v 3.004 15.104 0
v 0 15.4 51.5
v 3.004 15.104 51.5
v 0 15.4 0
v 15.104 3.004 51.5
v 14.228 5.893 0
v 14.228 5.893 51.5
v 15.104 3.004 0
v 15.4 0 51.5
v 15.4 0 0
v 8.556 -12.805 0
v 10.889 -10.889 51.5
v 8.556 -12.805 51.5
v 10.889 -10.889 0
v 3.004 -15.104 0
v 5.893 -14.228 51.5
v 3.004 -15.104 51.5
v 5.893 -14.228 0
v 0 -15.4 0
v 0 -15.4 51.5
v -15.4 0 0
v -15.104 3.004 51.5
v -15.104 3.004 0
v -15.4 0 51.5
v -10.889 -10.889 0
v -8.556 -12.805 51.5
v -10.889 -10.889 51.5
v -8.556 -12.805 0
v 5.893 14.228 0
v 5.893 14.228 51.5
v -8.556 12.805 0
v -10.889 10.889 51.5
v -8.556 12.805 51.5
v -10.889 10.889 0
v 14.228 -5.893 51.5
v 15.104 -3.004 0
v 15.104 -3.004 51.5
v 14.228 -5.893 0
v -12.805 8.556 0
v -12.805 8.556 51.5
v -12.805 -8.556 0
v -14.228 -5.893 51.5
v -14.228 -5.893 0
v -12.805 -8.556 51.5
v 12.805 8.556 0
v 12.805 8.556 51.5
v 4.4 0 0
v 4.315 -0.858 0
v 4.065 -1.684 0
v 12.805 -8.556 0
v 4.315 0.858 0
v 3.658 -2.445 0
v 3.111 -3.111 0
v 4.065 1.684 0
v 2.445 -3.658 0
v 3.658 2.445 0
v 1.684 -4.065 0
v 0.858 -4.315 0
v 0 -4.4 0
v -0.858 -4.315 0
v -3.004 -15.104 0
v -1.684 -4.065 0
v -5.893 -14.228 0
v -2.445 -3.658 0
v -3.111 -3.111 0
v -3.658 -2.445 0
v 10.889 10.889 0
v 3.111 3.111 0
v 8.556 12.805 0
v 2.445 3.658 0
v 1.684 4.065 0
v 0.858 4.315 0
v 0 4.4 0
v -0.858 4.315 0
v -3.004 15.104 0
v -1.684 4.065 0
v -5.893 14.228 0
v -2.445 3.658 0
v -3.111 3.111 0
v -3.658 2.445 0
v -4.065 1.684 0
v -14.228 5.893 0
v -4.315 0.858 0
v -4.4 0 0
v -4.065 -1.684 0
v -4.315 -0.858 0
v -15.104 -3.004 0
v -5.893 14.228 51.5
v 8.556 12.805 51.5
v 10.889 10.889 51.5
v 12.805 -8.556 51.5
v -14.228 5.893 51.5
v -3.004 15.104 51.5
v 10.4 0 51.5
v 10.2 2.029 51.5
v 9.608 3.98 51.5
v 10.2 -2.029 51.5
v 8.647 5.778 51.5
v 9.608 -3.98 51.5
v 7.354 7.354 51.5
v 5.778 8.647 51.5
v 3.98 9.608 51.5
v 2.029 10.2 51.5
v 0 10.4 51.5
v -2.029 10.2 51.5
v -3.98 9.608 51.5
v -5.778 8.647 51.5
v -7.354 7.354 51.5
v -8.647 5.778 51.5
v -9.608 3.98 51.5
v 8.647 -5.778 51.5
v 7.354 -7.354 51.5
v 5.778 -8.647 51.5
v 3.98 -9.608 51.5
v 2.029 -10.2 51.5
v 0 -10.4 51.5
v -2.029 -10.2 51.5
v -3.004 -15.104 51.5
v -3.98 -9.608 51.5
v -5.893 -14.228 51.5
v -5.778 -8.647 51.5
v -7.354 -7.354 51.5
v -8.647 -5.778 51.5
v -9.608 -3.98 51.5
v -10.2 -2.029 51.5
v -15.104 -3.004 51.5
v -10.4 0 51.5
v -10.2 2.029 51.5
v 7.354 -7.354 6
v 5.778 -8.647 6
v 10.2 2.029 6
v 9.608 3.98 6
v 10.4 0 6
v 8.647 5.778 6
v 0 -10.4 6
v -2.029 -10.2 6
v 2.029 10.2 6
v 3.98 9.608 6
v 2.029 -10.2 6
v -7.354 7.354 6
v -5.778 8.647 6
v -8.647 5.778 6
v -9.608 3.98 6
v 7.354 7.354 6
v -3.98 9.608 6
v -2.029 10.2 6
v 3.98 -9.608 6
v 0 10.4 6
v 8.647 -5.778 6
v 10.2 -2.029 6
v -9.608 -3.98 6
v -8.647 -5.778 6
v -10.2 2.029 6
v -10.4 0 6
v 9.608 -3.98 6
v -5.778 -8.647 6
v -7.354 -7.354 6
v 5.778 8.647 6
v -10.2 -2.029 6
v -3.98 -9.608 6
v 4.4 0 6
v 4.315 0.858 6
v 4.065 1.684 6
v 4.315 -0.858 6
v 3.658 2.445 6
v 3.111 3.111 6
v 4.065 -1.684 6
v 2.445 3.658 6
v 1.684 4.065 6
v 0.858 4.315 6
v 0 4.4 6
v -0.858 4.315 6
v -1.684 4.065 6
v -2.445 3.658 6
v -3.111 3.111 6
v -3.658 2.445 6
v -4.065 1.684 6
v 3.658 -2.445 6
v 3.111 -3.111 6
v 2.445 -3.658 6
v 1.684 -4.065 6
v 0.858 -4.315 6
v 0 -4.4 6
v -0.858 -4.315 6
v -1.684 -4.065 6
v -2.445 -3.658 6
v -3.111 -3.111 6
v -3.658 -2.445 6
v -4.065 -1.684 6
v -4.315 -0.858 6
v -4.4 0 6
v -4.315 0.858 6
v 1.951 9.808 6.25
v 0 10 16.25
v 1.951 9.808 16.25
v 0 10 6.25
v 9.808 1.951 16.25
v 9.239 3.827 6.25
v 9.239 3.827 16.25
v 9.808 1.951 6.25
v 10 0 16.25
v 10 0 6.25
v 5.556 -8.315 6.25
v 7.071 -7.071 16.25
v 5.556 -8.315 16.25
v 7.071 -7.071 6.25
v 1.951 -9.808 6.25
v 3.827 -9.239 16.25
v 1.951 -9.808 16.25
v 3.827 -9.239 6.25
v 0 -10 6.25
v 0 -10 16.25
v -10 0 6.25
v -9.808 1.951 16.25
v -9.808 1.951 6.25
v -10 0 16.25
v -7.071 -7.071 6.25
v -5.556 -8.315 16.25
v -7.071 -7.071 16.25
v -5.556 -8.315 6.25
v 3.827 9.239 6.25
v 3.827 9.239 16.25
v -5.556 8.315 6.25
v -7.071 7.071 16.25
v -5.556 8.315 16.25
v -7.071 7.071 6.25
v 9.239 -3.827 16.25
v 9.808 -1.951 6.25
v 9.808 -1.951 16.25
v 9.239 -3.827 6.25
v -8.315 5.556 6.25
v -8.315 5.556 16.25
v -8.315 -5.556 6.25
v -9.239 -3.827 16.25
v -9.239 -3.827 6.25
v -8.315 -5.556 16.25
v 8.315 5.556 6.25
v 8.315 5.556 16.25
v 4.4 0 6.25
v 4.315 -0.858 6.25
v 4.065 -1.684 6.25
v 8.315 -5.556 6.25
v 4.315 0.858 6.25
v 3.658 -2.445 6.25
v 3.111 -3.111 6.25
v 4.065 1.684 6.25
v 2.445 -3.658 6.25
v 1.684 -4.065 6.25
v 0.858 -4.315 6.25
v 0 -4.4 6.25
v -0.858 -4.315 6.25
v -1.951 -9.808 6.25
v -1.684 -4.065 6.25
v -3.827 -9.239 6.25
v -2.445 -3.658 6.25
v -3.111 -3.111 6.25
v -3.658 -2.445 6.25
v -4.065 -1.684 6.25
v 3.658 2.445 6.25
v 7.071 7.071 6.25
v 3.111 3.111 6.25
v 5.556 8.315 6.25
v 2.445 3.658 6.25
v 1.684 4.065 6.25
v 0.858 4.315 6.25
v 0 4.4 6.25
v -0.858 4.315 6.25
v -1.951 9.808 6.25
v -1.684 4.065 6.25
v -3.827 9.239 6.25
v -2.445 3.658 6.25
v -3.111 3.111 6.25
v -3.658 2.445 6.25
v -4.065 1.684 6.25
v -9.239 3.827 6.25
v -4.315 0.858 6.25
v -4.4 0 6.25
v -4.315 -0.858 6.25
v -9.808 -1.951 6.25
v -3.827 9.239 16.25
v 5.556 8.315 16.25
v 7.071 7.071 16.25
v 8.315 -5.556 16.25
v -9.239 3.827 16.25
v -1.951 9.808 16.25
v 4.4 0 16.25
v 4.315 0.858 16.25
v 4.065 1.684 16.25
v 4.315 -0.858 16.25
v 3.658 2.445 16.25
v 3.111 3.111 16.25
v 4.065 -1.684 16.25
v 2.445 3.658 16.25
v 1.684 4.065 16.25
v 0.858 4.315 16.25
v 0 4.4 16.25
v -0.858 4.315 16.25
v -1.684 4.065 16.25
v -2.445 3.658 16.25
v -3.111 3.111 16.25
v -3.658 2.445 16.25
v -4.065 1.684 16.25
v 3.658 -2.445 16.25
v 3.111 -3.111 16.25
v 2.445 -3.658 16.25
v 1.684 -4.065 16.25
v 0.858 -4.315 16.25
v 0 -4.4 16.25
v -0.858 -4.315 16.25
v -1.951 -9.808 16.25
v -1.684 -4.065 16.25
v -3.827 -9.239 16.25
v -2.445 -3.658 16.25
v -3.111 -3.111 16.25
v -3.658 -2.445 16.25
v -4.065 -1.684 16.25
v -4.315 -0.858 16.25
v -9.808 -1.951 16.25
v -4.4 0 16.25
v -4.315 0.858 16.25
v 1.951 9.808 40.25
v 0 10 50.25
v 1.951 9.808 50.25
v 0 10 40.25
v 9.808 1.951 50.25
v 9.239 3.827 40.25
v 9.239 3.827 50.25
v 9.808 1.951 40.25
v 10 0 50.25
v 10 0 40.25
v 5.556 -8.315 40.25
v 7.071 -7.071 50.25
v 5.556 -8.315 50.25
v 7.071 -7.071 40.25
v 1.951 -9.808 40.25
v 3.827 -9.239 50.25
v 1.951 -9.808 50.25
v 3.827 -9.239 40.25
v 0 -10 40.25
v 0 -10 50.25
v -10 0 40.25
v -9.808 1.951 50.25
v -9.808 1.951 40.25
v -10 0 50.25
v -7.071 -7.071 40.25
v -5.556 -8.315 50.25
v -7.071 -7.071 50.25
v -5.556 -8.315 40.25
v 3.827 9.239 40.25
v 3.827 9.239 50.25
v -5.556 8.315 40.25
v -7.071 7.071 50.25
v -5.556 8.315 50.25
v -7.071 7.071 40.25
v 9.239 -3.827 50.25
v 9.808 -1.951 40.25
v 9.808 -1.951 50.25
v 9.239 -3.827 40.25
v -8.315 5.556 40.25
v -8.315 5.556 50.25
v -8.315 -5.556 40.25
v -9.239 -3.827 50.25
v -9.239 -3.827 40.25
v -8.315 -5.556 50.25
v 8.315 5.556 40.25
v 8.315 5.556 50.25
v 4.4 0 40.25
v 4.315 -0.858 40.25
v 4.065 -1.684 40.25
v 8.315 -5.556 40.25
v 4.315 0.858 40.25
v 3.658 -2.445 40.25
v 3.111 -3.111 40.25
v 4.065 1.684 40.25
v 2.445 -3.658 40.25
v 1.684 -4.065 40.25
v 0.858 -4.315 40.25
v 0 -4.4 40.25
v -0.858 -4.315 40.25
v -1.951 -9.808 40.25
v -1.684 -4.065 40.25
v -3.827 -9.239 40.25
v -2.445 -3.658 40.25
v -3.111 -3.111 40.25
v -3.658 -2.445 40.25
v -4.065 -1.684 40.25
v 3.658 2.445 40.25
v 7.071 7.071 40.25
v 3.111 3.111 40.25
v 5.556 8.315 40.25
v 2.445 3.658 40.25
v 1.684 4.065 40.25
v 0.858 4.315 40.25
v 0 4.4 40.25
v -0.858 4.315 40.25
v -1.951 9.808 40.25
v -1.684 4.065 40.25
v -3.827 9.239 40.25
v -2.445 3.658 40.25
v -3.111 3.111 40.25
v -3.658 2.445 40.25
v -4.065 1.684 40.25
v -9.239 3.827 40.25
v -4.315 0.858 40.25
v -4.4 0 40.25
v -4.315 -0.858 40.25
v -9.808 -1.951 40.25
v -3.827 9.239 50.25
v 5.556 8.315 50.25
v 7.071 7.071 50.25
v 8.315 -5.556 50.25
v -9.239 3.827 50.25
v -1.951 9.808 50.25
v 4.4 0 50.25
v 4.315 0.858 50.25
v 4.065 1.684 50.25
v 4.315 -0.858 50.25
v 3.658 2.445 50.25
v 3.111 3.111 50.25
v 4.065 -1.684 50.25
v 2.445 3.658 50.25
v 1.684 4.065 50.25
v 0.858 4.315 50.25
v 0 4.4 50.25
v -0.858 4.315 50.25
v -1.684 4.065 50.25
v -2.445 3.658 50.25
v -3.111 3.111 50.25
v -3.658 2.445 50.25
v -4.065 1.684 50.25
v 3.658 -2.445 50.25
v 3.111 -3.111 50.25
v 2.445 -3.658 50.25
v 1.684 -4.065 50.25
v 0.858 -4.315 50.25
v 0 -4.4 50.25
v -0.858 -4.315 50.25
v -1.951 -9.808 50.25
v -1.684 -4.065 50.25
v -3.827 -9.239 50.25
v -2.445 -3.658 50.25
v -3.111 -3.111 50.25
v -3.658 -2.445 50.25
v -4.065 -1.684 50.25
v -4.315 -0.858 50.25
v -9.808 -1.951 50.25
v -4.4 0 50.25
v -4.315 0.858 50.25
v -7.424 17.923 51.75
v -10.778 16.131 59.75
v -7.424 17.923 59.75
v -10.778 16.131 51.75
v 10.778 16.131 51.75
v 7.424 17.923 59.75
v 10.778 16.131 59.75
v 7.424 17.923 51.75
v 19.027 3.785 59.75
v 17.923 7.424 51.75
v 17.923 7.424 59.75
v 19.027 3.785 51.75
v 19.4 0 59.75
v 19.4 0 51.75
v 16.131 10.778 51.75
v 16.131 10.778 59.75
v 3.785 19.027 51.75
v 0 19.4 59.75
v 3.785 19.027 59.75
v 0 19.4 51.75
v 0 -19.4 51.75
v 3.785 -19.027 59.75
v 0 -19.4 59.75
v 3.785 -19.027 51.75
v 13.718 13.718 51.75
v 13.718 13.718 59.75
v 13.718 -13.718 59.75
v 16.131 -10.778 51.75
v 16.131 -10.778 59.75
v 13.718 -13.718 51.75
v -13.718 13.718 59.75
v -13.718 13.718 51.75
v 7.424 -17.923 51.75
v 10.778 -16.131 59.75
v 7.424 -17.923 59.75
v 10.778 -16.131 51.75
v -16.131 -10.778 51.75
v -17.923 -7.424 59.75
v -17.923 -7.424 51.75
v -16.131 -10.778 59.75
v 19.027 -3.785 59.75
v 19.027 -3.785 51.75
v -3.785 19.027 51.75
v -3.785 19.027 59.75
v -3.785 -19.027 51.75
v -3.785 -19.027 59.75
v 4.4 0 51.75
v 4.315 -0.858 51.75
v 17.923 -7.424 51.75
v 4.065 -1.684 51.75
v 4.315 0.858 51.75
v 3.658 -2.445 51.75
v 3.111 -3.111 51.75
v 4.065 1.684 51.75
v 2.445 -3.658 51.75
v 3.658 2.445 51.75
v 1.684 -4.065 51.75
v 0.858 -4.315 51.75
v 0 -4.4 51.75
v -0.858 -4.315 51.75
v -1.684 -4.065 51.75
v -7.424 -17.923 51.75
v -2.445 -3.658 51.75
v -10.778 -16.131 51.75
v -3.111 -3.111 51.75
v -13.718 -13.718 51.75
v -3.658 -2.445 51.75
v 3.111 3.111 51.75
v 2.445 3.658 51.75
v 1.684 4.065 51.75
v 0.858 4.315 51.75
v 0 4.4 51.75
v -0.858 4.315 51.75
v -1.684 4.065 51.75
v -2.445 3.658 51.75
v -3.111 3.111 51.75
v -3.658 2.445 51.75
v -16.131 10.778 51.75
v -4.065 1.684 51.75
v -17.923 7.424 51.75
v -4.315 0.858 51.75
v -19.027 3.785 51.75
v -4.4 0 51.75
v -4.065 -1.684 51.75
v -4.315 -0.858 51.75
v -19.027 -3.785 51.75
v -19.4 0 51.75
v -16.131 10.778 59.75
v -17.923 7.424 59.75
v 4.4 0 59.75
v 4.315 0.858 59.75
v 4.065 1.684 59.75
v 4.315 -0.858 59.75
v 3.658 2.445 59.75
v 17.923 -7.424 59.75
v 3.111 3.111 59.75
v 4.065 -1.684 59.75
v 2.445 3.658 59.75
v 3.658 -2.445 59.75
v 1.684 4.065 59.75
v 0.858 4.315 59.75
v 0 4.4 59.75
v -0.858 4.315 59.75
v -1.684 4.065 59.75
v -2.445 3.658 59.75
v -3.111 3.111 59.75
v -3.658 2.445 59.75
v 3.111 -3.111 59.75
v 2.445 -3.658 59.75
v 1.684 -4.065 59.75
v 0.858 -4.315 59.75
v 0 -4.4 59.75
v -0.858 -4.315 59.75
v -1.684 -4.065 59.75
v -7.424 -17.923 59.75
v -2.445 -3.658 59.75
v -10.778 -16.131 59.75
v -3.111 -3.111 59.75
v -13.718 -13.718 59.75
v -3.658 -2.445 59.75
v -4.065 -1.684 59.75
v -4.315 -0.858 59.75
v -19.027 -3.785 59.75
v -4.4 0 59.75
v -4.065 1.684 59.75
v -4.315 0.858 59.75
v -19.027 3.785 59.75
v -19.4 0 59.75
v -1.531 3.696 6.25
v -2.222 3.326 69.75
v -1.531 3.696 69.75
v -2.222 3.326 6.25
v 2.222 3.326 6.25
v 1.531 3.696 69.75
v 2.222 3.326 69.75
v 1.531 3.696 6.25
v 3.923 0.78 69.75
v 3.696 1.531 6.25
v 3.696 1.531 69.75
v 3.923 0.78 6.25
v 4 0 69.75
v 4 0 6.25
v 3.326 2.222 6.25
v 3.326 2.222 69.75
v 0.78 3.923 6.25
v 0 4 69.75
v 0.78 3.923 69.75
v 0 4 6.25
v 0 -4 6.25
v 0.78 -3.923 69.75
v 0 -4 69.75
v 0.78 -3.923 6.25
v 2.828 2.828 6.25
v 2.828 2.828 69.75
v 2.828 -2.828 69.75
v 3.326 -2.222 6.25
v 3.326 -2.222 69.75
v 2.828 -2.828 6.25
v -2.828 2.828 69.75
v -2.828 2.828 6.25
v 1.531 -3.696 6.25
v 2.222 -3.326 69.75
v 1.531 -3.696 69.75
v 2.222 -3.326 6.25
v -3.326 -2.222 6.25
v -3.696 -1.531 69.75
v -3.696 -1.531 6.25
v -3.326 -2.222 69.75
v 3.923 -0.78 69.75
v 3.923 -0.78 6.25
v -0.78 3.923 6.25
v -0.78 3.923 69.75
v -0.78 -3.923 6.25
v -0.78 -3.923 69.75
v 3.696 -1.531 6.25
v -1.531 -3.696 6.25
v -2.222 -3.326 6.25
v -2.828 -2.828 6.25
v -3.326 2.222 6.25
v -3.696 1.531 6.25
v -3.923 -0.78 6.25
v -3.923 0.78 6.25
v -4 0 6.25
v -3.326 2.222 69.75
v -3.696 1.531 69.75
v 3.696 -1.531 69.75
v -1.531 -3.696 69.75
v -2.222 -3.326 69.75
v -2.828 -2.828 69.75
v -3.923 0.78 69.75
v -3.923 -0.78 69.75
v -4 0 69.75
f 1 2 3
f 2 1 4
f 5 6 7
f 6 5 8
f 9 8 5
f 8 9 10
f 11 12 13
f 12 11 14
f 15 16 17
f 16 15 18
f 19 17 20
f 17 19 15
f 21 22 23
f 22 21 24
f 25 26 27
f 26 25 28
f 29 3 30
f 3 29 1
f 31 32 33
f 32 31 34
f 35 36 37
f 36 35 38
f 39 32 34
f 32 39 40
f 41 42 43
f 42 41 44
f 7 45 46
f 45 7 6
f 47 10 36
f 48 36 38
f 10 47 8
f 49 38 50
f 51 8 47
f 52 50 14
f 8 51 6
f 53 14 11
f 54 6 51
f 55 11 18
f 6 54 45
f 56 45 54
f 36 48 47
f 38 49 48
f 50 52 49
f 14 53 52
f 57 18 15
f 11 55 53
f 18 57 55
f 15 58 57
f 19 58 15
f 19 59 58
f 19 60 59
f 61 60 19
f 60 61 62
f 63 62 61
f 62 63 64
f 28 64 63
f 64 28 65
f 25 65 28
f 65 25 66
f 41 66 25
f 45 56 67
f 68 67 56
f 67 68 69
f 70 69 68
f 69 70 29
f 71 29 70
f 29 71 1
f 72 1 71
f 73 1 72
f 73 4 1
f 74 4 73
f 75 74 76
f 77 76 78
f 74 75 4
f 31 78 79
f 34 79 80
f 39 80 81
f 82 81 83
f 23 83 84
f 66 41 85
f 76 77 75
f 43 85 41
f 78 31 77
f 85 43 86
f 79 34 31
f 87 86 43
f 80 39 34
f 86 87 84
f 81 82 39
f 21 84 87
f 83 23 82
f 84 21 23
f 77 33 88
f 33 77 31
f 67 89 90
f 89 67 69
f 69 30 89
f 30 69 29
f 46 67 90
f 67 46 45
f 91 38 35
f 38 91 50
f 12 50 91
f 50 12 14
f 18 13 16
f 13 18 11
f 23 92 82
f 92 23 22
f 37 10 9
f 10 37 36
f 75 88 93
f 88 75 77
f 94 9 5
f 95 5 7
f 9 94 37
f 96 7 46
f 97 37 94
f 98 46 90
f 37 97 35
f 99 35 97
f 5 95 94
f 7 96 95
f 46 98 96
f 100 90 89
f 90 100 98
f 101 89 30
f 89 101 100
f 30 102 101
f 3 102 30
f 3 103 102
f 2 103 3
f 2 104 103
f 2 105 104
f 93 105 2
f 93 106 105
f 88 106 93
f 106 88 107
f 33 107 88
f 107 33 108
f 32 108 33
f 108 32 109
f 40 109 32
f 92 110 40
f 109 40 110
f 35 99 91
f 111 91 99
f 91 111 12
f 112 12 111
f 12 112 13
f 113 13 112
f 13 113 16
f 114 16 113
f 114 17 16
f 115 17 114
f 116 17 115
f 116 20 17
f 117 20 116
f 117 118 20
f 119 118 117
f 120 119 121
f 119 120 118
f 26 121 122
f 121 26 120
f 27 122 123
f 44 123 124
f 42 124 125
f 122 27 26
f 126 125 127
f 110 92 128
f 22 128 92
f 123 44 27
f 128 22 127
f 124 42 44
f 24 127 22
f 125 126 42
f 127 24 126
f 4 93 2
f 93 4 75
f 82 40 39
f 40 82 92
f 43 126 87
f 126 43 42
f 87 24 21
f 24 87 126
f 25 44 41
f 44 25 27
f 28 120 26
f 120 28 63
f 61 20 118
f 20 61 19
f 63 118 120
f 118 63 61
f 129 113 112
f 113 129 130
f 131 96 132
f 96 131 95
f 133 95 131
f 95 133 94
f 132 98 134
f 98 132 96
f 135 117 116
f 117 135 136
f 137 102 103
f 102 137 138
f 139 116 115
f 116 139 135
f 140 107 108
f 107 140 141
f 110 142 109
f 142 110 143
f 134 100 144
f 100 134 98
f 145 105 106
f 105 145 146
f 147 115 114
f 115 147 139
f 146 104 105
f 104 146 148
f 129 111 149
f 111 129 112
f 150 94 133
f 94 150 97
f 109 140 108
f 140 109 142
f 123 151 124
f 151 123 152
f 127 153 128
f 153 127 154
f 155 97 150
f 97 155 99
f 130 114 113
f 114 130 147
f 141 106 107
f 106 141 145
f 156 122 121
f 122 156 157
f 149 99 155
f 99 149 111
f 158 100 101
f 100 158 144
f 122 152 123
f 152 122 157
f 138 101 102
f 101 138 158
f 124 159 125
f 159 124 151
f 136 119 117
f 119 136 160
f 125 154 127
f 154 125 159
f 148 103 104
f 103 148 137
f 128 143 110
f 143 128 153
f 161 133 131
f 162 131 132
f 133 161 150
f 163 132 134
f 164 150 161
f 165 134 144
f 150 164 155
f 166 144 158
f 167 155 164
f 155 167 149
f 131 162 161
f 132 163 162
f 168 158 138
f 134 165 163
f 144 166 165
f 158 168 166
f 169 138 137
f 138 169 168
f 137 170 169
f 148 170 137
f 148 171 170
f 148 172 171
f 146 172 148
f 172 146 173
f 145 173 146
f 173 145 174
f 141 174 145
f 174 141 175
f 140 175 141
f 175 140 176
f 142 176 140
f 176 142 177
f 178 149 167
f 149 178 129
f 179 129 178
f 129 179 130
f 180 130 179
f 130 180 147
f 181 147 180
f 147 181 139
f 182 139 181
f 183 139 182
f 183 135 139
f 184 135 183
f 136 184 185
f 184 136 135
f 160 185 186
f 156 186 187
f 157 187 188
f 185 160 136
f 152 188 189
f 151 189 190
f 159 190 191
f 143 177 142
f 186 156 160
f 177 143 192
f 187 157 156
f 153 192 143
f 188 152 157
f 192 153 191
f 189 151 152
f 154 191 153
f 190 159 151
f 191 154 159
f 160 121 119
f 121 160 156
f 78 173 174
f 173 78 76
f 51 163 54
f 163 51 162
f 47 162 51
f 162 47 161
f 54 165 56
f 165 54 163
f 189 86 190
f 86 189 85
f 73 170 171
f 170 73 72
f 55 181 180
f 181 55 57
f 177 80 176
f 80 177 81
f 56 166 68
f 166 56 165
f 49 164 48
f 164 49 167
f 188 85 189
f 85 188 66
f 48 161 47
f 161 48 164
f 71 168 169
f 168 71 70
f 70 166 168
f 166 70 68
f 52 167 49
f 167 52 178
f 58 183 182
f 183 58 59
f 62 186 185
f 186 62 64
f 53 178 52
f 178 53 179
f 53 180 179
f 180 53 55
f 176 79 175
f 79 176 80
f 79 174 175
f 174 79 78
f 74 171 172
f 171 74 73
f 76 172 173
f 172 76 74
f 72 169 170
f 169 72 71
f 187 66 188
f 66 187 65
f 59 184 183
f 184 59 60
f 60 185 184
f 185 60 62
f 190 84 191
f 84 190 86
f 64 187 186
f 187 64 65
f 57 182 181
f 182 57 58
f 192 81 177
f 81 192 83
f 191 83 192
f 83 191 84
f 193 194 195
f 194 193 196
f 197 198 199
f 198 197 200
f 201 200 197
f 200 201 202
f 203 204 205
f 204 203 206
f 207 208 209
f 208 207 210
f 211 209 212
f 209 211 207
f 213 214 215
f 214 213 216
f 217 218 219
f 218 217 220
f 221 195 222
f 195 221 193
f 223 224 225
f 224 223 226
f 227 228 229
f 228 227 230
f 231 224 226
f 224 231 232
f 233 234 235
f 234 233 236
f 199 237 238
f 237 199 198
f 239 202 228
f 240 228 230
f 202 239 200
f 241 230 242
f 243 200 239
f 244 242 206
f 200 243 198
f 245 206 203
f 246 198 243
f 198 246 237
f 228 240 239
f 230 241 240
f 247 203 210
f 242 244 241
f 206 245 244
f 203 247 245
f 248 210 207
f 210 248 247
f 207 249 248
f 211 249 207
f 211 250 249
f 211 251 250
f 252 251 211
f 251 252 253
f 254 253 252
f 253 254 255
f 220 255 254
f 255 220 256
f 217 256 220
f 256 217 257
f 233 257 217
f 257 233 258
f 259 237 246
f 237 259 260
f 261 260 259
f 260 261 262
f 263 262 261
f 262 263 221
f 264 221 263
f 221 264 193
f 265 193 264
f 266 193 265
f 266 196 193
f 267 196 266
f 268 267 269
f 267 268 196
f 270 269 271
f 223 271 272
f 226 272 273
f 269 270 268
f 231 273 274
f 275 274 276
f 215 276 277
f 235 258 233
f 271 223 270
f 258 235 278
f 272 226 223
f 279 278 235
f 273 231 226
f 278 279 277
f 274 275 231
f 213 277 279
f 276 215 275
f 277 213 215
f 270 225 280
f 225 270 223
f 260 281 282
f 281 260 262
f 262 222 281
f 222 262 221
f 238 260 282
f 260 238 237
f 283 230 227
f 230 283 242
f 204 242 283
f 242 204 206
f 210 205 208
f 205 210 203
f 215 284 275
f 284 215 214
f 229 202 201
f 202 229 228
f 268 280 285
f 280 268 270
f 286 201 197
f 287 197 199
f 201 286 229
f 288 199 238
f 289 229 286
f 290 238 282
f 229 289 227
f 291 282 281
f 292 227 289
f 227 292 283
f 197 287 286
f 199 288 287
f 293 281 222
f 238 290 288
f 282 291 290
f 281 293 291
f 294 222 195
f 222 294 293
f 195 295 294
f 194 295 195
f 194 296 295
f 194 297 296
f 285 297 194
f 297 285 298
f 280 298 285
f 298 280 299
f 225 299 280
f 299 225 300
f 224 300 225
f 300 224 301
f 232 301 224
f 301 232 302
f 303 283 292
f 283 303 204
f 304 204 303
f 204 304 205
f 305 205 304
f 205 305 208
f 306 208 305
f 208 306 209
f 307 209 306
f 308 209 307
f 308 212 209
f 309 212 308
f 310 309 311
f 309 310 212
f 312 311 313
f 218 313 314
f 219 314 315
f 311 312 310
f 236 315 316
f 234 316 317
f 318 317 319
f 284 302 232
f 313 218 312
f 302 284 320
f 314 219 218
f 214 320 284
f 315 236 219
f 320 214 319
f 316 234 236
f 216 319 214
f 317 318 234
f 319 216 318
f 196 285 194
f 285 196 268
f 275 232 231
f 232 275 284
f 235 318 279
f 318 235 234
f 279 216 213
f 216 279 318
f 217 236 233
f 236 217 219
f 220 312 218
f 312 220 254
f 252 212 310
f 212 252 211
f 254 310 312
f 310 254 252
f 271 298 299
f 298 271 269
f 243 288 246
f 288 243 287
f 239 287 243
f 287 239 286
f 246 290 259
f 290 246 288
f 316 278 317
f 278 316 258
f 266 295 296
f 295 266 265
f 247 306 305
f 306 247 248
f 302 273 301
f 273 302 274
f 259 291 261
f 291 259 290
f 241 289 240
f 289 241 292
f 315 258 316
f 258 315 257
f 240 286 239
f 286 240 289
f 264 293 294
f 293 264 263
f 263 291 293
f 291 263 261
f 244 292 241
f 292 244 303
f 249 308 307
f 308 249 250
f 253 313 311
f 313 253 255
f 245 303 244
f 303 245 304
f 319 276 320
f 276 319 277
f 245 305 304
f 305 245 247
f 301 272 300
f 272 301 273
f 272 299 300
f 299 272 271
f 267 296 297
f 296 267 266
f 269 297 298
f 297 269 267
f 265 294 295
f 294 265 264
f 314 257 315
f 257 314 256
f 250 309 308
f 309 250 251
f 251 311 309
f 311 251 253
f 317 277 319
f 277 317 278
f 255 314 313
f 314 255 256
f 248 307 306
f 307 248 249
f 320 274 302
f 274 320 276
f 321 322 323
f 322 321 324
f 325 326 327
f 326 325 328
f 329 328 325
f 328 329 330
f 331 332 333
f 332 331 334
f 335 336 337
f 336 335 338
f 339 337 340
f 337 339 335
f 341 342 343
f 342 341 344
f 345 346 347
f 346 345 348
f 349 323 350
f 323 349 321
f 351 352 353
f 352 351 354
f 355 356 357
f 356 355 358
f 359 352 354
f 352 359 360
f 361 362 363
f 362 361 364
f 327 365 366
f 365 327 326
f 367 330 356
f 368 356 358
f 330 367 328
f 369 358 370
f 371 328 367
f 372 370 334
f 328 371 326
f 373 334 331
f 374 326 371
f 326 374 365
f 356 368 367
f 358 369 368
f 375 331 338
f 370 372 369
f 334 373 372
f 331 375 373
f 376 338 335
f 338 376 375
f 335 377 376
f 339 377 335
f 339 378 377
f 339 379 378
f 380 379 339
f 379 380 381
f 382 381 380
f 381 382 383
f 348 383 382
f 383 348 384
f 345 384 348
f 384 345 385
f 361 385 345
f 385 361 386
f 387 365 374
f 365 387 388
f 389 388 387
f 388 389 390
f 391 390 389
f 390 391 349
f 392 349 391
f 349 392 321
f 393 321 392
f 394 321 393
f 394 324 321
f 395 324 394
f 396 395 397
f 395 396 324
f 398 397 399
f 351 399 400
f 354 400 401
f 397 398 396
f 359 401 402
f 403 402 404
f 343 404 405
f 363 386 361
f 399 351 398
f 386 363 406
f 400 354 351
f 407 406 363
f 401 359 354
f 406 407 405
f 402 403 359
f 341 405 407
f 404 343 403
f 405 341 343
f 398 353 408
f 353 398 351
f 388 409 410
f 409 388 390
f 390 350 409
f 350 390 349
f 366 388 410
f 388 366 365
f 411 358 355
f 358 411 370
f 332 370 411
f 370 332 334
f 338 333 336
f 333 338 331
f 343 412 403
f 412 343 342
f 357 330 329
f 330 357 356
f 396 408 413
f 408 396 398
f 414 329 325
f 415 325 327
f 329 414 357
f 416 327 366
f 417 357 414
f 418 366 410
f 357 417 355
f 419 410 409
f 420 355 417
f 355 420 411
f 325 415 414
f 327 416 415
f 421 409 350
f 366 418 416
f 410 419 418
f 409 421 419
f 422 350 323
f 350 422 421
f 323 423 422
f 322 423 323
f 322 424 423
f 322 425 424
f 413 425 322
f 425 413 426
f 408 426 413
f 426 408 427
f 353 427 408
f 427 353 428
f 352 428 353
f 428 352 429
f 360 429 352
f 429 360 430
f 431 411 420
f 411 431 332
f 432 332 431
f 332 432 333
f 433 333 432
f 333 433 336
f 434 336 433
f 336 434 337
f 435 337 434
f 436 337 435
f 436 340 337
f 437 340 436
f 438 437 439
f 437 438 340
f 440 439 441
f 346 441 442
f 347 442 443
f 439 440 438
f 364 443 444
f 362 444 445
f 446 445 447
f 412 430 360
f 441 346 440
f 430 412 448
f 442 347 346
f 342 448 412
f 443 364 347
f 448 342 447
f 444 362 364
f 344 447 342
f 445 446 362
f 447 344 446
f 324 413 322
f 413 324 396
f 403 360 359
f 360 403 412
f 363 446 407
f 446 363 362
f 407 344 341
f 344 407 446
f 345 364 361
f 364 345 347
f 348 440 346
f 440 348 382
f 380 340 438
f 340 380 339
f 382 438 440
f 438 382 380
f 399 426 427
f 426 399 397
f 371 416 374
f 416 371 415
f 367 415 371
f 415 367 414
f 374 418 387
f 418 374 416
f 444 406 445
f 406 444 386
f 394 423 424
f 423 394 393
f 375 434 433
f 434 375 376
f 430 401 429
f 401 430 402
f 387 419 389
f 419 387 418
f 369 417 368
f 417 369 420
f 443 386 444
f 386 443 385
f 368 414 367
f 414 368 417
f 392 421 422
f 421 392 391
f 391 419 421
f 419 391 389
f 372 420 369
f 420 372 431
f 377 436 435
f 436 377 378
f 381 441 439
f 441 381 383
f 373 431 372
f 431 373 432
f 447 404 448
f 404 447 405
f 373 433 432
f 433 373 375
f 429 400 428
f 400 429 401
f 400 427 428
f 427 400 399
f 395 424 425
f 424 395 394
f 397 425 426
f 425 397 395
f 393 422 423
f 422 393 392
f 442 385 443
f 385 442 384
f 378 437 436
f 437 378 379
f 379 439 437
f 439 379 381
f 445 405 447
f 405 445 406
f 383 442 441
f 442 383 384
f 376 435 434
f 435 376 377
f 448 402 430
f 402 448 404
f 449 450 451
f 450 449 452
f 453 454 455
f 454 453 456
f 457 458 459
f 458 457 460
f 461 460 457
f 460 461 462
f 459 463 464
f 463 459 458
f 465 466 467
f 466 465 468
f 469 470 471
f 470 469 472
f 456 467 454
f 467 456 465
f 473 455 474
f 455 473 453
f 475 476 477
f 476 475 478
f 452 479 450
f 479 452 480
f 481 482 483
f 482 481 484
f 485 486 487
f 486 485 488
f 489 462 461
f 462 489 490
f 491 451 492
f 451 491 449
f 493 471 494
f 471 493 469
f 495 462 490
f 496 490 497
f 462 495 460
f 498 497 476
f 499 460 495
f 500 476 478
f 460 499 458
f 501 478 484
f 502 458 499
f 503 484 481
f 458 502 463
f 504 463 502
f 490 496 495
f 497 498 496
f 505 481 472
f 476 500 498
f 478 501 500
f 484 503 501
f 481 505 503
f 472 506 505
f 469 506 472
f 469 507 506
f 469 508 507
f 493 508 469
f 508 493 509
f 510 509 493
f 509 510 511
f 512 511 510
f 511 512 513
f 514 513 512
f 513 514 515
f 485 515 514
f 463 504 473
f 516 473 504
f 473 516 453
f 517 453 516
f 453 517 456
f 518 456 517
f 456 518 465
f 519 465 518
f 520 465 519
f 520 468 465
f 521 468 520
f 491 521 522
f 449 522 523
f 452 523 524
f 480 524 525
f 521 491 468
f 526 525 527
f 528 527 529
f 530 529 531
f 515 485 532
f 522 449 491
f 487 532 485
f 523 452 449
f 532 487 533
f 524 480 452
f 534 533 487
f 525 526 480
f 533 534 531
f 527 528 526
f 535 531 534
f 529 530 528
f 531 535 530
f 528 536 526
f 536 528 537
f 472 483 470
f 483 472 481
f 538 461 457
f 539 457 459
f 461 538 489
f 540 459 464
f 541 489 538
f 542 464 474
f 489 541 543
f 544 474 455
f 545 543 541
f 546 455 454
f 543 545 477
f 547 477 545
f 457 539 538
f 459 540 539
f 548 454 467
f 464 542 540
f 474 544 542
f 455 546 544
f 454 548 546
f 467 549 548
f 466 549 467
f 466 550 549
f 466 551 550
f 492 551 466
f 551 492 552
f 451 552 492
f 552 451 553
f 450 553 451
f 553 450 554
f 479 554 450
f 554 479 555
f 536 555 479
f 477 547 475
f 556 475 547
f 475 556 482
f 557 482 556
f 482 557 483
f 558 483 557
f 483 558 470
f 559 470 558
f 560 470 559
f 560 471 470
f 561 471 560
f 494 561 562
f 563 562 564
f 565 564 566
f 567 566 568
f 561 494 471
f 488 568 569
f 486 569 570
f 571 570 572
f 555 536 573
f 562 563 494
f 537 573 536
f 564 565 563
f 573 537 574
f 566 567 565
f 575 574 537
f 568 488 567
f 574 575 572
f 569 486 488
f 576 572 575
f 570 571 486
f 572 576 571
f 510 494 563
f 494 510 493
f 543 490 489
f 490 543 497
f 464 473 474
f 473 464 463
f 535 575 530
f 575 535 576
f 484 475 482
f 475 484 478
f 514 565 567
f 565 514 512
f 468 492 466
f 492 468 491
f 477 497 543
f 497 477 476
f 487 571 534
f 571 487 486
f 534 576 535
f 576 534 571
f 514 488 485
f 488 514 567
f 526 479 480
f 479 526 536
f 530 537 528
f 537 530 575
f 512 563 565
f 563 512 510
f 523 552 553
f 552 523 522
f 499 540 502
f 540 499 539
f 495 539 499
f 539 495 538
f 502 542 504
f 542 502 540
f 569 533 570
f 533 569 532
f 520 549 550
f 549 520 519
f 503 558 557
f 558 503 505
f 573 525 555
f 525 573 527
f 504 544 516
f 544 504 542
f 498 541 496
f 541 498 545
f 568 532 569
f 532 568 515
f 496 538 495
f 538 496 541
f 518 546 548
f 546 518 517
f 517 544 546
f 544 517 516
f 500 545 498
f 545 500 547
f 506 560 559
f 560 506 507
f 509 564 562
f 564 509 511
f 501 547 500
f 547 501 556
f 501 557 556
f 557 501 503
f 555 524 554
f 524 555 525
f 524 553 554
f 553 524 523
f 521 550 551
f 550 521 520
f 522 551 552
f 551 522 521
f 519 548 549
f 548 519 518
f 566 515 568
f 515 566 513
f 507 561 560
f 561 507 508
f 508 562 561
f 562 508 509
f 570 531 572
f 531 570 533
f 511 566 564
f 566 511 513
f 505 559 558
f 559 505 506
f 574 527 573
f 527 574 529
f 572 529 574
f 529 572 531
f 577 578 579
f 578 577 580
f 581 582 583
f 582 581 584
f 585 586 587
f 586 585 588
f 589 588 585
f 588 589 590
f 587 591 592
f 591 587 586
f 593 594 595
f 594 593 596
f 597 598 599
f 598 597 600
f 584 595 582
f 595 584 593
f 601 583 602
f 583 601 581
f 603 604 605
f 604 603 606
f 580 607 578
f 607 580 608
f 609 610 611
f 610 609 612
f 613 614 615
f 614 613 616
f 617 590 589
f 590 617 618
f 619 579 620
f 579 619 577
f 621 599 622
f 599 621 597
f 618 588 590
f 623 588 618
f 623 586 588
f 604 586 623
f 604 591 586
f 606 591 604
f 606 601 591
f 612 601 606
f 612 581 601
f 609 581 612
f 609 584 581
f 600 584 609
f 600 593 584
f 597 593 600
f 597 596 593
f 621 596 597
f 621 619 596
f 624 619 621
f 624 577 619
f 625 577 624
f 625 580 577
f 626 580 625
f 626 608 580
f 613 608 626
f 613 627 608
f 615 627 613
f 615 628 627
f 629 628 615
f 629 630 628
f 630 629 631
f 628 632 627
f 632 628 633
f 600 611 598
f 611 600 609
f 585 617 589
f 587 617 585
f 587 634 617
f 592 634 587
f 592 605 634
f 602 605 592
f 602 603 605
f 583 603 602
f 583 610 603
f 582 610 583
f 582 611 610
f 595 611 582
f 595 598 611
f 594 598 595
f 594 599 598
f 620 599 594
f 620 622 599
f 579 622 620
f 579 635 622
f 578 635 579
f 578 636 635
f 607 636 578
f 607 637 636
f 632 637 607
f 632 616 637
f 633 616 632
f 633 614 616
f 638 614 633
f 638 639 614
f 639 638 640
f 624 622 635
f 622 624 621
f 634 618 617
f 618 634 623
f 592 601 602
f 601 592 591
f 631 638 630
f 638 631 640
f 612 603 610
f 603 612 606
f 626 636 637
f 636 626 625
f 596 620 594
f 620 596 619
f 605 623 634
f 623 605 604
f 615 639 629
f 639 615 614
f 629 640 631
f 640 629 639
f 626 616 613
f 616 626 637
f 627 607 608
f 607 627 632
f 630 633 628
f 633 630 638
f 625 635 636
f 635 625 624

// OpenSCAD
$fn = 32;

// ------------------------------------------------------------------------
// Shaft station: cup d30.8 x 51.5 mm, shaft d8
// Every part is its own module, assembly() places every instance.
// ------------------------------------------------------------------------

// --- part 1 ---
module housing_cup() {
  difference() {
    cylinder(h = 51.5, d = 30.8);
    translate([0, 0, 6]) cylinder(h = 46.5, d = 20.8);
    translate([0, 0, -1]) cylinder(h = 8, d = 8.8);
  }
}

// --- part 2 ---
module bearing_lower() {
  difference() {
      translate([0, 0, 0]) cylinder(h = 10, d = 20);
      translate([0, 0, -1]) cylinder(h = 12, d = 8.8);
    }
}

// --- part 3 ---
module bearing_upper() {
  difference() {
      translate([0, 0, 0]) cylinder(h = 10, d = 20);
      translate([0, 0, -1]) cylinder(h = 12, d = 8.8);
    }
}

// --- part 4 ---
module station_shaft() {
  translate([0, 0, -31.75]) cylinder(h = 63.5, d = 8);
}

// --- part 5 ---
module station_cover() {
  difference() {
    cylinder(h = 8, d = 38.8);
    translate([0, 0, -1]) cylinder(h = 10, d = 8.8);
  }
}

// --- assembly ---
module assembly() {
  color([0.80, 0.24, 0.20]) translate([0, 0, 0]) rotate([0, 0, 0]) housing_cup();
  color([0.20, 0.45, 0.75]) translate([0, 0, 6.25]) rotate([0, 0, 0]) bearing_lower();
  color([0.25, 0.62, 0.32]) translate([0, 0, 40.25]) rotate([0, 0, 0]) bearing_upper();
  color([0.92, 0.70, 0.18]) translate([0, 0, 38]) rotate([0, 0, 0]) station_shaft();
  color([0.58, 0.35, 0.70]) translate([0, 0, 51.75]) rotate([0, 0, 0]) station_cover();
}

assembly();
